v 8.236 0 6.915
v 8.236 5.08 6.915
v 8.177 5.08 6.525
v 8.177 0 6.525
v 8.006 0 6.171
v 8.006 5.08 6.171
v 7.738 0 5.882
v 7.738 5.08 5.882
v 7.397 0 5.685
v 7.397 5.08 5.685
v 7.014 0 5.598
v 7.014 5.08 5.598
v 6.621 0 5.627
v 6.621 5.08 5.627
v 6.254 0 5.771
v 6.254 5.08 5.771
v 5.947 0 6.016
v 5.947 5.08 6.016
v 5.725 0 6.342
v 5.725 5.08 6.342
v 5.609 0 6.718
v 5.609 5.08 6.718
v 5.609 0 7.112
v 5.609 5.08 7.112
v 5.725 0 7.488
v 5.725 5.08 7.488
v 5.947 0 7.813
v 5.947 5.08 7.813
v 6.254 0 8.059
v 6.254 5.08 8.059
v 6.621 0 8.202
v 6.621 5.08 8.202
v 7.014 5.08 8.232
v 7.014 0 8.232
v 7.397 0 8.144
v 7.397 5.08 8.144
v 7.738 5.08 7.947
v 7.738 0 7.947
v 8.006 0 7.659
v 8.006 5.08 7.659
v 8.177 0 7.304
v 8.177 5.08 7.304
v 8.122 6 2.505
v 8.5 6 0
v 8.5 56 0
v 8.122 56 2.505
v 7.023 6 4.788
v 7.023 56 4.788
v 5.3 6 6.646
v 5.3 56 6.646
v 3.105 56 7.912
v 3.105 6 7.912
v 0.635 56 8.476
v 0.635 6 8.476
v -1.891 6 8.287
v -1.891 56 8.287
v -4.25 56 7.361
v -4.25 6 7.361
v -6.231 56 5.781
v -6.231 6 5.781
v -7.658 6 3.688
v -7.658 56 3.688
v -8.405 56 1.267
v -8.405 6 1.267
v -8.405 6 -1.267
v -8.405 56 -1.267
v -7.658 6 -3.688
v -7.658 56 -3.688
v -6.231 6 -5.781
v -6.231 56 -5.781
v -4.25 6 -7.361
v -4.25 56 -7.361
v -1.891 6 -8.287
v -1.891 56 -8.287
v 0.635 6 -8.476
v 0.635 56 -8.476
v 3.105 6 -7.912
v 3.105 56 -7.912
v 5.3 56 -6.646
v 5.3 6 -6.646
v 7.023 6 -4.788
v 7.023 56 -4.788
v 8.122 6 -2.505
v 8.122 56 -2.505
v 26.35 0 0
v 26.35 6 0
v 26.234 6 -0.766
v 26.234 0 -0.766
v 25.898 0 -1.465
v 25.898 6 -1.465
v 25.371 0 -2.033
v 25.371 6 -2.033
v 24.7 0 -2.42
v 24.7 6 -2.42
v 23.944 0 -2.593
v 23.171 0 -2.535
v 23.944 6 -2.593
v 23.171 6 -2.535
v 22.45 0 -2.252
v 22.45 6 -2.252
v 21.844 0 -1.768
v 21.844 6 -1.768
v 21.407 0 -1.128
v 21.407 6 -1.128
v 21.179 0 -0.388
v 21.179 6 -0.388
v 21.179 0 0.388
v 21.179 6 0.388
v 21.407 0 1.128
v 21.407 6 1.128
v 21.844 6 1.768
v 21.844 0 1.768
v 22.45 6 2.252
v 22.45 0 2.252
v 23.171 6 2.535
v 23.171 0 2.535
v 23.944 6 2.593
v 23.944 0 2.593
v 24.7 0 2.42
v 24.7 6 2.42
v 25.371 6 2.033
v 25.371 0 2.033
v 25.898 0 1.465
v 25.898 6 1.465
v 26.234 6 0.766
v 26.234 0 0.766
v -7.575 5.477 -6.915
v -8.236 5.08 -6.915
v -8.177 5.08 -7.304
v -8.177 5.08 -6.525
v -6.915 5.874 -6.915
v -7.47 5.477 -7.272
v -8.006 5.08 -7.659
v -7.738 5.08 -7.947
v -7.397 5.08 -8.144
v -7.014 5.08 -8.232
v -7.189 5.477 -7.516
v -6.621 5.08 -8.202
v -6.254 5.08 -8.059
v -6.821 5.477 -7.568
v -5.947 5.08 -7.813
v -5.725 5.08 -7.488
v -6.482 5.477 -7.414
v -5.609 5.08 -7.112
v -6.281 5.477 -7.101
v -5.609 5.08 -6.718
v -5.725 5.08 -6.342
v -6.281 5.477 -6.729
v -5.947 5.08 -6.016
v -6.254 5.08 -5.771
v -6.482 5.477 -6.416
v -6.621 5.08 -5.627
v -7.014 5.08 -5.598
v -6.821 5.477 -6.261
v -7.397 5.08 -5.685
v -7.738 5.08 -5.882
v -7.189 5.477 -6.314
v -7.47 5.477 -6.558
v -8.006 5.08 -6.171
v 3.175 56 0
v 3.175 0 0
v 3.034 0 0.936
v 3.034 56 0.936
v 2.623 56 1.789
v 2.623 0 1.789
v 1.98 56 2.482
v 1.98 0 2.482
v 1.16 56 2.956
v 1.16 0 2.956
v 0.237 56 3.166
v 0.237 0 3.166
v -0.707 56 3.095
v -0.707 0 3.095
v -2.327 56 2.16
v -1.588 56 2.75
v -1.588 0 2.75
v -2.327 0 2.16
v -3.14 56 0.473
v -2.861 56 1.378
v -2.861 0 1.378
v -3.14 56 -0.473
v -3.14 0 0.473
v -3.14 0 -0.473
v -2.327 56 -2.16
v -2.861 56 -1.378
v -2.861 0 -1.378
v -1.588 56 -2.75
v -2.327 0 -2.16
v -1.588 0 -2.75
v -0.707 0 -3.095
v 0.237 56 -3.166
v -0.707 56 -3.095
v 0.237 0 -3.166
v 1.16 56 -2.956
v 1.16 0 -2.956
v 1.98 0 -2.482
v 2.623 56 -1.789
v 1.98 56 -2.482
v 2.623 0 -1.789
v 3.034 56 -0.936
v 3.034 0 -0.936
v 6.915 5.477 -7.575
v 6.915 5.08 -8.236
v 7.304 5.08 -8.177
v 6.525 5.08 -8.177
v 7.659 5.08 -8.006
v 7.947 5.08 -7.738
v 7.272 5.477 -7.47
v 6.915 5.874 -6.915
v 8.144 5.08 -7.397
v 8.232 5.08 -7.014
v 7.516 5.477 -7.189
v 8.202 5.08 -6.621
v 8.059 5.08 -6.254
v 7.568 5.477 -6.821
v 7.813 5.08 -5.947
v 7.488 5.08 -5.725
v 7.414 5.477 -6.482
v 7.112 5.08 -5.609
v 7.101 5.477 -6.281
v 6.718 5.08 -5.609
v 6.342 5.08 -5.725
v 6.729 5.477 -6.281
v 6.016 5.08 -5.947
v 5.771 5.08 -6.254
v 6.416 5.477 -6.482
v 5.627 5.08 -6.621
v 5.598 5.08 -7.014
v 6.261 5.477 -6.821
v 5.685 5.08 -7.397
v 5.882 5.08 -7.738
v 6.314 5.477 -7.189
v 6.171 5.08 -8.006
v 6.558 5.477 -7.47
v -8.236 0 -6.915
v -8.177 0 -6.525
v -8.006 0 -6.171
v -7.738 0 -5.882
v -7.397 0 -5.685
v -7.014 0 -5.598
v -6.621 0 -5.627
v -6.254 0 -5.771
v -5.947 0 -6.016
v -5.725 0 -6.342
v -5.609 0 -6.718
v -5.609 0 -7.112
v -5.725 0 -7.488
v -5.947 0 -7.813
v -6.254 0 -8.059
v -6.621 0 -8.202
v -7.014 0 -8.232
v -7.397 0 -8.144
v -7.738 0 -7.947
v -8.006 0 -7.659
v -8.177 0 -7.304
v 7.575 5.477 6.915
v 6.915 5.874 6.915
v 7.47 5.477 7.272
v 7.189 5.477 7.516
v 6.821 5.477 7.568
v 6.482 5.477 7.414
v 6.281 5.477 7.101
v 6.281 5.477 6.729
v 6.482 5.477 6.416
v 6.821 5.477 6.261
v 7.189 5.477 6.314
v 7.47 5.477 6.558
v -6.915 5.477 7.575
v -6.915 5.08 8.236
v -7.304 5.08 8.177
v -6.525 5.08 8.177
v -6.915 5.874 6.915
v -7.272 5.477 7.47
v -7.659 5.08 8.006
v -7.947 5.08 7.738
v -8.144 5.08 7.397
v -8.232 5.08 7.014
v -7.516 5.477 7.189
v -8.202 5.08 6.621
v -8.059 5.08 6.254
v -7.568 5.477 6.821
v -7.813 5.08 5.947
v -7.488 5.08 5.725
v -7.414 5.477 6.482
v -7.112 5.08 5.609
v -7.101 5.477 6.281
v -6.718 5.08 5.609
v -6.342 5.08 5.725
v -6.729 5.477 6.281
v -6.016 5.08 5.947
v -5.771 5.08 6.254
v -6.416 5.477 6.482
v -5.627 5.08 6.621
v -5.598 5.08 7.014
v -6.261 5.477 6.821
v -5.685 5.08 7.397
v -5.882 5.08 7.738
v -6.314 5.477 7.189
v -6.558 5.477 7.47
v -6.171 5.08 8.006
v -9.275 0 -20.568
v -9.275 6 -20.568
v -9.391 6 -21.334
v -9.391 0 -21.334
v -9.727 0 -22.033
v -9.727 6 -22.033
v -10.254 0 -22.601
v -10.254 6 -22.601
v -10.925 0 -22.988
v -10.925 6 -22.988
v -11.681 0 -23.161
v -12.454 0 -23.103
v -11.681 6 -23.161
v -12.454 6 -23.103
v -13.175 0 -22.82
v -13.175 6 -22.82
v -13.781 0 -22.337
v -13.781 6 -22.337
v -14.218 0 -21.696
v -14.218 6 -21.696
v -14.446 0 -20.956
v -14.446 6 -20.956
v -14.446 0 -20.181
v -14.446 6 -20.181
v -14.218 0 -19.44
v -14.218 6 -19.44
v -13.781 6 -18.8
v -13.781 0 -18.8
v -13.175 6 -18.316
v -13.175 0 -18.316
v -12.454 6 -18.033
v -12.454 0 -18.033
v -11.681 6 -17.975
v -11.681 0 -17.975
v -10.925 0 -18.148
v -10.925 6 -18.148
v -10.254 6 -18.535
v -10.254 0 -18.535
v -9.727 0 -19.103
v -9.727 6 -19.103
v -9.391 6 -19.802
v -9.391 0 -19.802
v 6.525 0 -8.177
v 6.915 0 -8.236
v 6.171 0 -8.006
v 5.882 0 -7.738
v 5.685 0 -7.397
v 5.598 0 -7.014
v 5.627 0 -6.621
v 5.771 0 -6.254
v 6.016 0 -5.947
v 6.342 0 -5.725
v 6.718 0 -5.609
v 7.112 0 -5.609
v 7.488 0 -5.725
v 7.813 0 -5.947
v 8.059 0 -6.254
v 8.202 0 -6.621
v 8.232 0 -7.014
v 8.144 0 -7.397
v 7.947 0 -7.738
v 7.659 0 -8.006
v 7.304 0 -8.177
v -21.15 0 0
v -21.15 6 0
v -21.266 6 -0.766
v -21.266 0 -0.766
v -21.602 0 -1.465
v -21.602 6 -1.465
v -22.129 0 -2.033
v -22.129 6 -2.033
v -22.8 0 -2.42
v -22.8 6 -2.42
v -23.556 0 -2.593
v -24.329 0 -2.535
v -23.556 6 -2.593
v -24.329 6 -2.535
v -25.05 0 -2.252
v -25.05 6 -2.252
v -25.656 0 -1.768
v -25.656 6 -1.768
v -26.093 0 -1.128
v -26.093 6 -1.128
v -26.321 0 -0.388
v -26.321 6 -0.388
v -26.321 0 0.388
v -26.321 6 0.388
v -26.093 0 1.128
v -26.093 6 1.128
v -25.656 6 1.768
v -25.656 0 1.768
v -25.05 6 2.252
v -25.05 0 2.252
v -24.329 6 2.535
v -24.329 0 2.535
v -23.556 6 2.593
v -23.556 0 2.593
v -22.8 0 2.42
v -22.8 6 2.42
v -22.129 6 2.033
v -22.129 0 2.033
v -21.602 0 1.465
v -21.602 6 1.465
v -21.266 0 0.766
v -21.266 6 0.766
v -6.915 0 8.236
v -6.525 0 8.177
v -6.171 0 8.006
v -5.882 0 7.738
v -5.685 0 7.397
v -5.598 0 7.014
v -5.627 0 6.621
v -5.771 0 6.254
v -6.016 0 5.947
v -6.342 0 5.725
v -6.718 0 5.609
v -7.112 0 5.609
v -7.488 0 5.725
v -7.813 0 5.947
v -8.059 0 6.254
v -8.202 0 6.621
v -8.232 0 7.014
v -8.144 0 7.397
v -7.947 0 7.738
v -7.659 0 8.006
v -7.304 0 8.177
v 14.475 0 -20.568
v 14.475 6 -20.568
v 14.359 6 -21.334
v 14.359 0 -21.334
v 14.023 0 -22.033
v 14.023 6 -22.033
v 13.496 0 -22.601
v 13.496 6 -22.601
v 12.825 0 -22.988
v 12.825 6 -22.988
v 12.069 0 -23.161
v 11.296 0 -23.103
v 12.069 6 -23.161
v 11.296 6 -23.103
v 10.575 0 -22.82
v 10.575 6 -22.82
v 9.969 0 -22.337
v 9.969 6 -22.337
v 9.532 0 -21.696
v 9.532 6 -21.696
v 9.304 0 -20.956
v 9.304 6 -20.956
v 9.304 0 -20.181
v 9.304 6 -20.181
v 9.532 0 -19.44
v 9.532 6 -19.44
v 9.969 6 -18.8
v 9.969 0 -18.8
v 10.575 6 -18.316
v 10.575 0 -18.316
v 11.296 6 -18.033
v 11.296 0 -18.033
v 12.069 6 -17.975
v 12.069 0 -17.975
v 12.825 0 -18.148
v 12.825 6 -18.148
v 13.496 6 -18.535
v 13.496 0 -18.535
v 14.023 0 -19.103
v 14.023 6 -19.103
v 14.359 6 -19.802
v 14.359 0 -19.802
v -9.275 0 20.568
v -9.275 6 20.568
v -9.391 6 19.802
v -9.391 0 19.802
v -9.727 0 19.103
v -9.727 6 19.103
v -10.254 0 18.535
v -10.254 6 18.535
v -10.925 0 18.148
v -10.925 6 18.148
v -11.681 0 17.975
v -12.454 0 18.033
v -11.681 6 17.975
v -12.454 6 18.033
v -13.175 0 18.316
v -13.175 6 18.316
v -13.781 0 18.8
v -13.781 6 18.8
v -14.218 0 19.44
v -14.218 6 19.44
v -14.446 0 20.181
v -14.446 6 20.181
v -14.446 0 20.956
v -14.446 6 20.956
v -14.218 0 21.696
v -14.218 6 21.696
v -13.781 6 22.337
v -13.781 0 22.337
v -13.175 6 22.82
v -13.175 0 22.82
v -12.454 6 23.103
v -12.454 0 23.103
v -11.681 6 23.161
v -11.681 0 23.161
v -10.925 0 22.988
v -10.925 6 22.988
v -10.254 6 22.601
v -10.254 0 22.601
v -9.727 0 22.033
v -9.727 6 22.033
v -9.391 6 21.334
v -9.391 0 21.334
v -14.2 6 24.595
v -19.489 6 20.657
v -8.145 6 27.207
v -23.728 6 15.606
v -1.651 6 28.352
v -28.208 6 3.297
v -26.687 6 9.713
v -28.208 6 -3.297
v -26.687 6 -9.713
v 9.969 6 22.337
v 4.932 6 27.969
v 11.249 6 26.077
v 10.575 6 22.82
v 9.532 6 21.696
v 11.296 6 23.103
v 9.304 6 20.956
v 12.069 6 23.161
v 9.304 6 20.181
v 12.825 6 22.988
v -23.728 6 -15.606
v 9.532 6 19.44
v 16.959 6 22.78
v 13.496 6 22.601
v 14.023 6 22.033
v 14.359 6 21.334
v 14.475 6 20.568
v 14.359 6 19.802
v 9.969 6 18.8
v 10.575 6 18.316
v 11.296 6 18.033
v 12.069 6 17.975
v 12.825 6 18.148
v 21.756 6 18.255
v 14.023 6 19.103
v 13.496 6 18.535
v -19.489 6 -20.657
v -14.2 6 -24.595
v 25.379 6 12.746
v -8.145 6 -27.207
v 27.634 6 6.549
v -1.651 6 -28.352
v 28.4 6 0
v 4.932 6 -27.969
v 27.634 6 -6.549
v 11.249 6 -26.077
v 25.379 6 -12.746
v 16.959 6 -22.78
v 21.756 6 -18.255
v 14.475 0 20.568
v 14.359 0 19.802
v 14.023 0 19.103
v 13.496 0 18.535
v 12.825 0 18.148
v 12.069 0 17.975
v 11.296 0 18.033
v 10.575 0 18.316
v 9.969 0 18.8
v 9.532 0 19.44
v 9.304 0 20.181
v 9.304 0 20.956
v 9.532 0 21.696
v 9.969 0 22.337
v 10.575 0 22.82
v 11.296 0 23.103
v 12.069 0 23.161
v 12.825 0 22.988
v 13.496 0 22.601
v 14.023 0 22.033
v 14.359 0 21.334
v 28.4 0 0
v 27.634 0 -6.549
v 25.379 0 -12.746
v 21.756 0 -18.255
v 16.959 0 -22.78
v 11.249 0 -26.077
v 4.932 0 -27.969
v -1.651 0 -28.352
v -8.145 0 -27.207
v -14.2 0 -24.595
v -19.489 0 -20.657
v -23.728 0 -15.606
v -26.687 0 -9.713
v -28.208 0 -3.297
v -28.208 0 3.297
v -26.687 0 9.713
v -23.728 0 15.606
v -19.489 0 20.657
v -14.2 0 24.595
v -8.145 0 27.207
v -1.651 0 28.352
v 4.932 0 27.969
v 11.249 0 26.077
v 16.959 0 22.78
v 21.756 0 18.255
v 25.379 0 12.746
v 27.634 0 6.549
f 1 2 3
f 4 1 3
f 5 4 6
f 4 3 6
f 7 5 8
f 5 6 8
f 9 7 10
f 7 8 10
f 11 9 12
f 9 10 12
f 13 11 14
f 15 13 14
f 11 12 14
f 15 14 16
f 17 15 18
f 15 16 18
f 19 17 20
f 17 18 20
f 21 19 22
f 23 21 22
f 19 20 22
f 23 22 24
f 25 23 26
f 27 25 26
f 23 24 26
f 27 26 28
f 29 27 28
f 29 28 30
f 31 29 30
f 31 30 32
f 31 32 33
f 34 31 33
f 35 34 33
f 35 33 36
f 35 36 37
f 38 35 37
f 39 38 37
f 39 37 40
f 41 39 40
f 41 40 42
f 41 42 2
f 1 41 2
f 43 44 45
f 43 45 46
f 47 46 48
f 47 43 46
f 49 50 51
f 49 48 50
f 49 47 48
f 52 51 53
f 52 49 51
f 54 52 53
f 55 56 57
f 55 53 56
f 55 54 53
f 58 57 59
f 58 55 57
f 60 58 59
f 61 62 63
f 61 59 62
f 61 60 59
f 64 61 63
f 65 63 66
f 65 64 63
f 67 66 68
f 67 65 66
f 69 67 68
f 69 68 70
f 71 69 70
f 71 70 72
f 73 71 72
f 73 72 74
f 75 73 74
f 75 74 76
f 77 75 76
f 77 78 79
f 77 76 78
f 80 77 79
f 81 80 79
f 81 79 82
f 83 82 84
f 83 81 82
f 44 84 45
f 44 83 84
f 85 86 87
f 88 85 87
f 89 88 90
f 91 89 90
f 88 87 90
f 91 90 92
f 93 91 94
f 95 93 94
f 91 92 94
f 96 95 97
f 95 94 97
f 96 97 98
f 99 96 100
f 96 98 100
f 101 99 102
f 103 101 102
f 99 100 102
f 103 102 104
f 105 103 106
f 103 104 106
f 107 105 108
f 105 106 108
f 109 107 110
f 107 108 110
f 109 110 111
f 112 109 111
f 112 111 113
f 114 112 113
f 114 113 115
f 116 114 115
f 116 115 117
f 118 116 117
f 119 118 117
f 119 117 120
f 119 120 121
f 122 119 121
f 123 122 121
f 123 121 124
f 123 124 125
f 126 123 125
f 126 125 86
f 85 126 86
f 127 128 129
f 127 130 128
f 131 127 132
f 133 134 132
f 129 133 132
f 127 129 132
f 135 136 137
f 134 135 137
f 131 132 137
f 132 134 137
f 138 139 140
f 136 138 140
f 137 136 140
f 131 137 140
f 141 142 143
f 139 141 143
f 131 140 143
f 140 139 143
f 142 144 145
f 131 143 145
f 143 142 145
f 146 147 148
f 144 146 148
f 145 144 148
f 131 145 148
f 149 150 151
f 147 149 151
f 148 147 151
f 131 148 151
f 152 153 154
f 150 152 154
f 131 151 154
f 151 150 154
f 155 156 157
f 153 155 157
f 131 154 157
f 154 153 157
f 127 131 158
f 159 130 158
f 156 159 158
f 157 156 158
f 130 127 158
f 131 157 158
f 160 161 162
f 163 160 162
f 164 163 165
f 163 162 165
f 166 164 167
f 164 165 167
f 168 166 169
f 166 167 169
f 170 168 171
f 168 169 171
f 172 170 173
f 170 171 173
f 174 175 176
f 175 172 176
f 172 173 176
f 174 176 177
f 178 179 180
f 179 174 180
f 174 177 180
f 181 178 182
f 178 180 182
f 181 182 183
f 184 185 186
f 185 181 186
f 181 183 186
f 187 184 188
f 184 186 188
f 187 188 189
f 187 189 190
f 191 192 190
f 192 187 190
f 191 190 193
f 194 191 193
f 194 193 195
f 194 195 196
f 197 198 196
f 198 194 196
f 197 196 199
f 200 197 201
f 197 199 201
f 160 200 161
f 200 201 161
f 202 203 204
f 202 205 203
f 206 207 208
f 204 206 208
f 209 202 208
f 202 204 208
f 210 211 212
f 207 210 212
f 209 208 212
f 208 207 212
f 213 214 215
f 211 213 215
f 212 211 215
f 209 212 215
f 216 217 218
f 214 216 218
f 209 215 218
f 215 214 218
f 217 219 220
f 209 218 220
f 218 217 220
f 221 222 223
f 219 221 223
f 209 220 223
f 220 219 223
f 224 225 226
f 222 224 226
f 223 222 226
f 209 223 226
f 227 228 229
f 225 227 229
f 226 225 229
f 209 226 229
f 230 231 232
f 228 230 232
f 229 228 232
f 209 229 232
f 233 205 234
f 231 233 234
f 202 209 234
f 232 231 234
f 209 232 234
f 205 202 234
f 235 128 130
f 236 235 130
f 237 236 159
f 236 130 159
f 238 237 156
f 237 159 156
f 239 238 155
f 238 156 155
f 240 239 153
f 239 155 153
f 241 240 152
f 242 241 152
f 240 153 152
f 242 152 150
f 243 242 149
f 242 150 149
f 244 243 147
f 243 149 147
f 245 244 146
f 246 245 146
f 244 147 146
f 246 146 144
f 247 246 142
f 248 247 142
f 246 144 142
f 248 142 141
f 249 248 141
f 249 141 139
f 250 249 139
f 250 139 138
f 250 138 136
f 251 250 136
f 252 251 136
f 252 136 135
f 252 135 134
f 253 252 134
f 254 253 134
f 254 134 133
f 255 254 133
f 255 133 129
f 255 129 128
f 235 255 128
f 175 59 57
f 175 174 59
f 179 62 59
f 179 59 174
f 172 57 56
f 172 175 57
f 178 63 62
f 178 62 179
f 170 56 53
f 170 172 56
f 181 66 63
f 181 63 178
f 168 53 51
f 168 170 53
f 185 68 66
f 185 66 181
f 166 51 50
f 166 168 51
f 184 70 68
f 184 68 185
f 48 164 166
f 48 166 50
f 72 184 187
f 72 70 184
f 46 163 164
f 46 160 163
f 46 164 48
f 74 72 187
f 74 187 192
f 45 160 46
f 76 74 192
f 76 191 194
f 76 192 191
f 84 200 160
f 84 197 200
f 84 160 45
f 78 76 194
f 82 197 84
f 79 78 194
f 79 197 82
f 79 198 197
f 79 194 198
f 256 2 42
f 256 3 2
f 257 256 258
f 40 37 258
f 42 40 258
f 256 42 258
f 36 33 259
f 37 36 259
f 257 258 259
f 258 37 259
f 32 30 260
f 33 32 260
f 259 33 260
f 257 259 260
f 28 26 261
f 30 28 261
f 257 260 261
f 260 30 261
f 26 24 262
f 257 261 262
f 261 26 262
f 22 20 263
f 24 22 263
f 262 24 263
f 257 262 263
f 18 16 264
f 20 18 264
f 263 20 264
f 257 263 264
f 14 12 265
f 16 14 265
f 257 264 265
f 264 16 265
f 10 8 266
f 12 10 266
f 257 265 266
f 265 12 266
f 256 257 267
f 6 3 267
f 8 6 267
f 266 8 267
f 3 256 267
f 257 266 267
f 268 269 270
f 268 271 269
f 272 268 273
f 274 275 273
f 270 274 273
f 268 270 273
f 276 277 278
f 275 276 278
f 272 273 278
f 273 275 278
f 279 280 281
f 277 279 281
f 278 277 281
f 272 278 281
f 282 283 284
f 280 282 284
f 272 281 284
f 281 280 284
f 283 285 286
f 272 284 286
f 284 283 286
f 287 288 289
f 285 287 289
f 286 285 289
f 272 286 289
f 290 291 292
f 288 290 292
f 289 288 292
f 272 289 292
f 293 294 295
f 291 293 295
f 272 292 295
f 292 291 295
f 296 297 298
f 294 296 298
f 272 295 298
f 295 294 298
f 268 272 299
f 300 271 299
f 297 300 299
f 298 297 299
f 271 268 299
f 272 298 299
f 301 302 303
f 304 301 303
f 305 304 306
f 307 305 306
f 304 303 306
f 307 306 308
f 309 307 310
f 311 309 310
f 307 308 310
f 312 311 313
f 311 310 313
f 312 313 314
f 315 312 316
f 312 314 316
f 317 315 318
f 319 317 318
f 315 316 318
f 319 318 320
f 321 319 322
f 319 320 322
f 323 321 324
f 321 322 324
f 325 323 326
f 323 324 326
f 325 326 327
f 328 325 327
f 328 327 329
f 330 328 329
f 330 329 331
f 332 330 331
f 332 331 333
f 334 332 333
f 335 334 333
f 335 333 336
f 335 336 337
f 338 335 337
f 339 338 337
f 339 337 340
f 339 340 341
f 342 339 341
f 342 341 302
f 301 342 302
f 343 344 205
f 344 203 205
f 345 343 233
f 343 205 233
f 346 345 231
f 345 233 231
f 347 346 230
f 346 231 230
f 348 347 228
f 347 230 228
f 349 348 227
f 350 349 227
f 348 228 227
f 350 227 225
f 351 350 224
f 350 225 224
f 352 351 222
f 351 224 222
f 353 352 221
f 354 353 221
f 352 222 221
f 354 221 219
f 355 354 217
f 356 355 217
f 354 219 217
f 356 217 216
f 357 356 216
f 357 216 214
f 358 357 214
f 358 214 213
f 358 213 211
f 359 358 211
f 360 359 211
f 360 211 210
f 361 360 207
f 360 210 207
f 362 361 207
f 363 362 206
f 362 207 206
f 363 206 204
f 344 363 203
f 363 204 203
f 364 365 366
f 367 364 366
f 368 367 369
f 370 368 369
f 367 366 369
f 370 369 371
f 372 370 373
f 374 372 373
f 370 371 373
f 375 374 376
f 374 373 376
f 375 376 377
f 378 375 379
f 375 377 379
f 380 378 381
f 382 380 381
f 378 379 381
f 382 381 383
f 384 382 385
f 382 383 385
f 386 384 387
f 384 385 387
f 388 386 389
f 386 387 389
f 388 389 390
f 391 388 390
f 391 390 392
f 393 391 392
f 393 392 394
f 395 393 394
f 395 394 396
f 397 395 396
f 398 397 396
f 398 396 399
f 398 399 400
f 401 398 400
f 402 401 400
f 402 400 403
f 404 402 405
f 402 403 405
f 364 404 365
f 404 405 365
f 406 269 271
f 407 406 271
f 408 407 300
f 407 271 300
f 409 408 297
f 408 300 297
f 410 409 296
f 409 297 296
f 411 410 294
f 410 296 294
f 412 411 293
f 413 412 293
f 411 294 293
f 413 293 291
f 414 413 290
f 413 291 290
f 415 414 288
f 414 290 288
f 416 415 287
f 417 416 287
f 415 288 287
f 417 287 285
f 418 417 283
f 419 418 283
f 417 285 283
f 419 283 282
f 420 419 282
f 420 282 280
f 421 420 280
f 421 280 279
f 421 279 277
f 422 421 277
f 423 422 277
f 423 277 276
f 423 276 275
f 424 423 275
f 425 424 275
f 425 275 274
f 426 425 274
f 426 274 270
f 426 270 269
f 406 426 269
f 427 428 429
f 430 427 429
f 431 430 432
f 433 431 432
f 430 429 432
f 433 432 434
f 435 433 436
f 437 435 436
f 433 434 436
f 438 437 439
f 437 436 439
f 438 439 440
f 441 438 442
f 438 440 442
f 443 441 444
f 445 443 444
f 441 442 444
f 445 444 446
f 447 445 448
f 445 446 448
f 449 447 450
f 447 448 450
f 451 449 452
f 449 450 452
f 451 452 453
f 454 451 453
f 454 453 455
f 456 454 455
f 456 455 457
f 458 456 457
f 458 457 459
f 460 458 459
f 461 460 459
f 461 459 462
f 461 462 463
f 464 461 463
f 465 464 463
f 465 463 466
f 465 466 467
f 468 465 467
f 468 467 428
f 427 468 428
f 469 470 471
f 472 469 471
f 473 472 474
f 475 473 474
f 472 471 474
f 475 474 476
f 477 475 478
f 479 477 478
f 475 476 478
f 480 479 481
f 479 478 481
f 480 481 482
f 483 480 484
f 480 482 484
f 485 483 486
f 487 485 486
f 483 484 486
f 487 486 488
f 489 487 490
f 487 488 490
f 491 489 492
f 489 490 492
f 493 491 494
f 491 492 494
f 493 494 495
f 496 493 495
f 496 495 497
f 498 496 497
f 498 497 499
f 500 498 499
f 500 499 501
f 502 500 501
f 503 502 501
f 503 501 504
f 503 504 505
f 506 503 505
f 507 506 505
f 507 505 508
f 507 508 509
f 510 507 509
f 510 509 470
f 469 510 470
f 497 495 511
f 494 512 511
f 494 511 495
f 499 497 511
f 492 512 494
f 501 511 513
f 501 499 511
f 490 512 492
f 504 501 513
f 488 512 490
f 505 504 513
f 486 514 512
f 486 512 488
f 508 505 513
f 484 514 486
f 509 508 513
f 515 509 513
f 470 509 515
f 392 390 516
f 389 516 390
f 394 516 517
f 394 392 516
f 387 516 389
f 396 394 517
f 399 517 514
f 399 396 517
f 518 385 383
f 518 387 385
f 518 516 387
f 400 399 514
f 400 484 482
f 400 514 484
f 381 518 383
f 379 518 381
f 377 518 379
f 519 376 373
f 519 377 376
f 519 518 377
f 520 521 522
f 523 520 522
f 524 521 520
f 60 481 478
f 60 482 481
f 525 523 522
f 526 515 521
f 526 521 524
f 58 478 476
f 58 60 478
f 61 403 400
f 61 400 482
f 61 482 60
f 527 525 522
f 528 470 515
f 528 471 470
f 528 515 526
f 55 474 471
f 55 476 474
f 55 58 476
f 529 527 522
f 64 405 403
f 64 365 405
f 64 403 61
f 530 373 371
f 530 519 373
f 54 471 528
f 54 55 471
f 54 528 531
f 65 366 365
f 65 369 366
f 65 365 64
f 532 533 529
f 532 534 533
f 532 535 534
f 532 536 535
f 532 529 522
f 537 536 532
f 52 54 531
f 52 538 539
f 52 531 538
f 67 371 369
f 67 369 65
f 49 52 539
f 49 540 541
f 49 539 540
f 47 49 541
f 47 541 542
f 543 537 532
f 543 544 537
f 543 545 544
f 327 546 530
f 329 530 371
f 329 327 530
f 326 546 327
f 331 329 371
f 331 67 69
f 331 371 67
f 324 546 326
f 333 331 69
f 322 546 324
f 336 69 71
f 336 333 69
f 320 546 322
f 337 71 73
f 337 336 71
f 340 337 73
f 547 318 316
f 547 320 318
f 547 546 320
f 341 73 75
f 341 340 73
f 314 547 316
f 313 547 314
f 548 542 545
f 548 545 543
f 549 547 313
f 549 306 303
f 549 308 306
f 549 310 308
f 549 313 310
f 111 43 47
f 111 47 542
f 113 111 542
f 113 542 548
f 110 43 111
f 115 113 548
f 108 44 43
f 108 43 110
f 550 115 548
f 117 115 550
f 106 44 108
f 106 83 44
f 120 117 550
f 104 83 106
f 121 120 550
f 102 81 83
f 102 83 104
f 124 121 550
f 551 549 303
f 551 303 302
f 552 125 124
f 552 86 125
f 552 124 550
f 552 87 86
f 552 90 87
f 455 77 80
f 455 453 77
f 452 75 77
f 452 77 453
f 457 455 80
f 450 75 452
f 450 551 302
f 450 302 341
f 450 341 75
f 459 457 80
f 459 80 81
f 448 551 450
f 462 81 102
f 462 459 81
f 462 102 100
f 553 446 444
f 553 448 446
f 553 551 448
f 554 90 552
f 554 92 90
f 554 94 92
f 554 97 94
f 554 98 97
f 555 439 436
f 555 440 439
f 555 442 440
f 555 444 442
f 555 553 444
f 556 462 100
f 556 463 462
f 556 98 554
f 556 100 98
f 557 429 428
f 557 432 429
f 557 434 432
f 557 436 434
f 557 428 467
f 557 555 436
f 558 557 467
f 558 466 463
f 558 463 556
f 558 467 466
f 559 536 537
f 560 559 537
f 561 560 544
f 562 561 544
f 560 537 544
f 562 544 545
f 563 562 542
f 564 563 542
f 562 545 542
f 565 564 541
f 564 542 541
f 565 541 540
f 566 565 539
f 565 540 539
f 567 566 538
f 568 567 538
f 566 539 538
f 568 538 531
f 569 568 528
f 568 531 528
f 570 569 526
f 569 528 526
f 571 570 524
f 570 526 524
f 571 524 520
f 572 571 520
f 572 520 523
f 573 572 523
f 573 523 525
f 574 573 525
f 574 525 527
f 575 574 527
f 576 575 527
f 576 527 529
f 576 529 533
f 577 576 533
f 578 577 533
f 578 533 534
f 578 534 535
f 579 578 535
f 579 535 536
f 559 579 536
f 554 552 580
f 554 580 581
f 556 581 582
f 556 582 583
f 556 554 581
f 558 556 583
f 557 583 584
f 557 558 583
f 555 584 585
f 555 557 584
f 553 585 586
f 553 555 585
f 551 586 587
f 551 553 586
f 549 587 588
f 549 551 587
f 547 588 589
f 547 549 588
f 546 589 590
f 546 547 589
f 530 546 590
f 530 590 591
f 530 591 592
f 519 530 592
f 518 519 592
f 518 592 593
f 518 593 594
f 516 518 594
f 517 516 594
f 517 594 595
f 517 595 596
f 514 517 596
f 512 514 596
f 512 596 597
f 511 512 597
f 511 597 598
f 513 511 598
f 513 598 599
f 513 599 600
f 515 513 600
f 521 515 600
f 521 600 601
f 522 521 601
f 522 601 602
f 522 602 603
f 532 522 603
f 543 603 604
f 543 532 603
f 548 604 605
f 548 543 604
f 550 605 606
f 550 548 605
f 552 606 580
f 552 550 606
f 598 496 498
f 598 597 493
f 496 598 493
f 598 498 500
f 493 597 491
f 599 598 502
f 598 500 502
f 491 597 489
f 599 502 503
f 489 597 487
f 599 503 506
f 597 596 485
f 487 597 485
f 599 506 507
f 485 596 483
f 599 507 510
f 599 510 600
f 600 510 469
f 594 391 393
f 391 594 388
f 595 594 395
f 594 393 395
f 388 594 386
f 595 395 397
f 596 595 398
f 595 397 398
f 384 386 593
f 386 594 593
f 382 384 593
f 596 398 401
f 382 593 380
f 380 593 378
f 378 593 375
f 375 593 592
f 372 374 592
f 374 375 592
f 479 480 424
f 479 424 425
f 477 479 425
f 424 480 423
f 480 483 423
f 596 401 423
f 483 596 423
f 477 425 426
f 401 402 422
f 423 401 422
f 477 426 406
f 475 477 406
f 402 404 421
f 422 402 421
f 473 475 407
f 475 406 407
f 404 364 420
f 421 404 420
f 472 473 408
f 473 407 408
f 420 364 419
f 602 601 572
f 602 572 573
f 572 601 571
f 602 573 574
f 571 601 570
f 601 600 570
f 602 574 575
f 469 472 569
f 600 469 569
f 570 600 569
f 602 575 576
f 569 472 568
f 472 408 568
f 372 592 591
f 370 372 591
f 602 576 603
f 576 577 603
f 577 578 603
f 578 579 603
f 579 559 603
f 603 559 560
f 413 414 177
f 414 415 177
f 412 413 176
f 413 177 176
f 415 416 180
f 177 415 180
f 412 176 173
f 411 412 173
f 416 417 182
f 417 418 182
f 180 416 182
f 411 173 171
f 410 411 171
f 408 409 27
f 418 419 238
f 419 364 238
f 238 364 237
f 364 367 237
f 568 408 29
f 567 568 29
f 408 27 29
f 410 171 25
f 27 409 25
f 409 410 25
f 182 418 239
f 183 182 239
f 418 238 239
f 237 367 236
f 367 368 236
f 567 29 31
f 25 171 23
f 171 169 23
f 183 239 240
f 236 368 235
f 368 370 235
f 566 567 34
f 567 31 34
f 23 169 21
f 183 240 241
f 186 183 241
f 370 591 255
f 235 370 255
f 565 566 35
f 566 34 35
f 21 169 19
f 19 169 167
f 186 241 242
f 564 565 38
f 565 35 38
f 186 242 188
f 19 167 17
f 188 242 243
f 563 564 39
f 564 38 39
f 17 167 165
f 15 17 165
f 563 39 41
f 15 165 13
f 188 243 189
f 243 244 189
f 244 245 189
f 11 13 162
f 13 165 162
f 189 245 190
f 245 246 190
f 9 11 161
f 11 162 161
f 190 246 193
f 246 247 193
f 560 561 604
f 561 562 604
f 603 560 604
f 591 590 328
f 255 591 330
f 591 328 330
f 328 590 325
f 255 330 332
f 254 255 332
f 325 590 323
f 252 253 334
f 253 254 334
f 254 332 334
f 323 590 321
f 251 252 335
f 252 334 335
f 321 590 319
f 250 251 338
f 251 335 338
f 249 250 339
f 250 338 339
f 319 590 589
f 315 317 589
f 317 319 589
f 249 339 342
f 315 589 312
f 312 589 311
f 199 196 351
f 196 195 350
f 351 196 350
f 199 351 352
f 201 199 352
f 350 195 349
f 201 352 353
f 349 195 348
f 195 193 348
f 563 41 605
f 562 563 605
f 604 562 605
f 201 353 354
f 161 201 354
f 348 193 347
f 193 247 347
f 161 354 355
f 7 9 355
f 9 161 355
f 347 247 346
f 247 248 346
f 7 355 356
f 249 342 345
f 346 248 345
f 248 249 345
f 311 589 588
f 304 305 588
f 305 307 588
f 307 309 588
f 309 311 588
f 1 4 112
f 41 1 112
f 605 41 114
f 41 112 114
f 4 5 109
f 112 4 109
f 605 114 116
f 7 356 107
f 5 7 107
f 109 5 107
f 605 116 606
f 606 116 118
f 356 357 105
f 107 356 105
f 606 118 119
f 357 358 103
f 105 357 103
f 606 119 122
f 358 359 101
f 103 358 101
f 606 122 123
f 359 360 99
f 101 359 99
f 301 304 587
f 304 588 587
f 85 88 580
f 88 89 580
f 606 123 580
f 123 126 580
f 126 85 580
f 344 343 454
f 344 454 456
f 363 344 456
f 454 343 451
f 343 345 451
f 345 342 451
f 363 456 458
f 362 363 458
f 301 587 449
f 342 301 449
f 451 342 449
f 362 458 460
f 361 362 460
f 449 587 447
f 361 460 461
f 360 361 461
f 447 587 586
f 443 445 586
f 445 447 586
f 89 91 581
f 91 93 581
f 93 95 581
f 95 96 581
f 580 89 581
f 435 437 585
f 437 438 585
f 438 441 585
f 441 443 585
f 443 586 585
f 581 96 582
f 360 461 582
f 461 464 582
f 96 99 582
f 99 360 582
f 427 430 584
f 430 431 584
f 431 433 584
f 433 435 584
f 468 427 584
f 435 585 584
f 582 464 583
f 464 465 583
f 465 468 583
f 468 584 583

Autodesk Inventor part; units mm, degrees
ref_plane "YZ Plane" through (0, 0, 0) normal (1, 0, 0) x (0, 1, 0)
ref_plane "XZ Plane" through (0, 0, 0) normal (0, 1, 0) x (-1, 0, 0)
ref_plane "XY Plane" through (0, 0, 0) normal (0, 0, 1) x (1, 0, 0)
sketch "Sketch1" plane through (0, 0, 0) normal (0, 0, 1) x (1, 0, 0)
  line L0 (0, 0) -> (0, 26.4) construction
  line L1 (3.175, 56) -> (3.175, 0)
  line L2 (28.4, 0) -> (28.4, 6)
  line L3 (3.175, 0) -> (28.4, 0)
  line L4 (8.5, 56) -> (8.5, 6)
  line L5 (8.5, 6) -> (28.4, 6)
  line L6 (8.5, 56) -> (8.5, -232.68) construction
  line L7 (8.5, 56) -> (8.5, 16.2) construction
  line L8 (8.5, 56) -> (3.175, 56)
  dimension "d0" = 26.4
  dimension "d5" = 6
  dimension "d11" = 5.325
  dimension "d32" = 3.175
  dimension "d37" = 28.4
  dimension "d38" = 50
revolve "Revolution1" add sketch "Sketch1" angle 360 about axis through (0, 0, 0) along (0, 1, 0)
sketch "Sketch4" plane through (0, 6, 0) normal (0, 1, 0) x (1, 0, 0)
  line L0 (0, 0) -> (-23.75, 0) construction
  circle A0 centre (-23.75, 0) radius 2.6
  circle A1 centre (-11.875, -20.5681) radius 2.6
  circle A2 centre (11.875, -20.5681) radius 2.6
  circle A3 centre (23.75, 0) radius 2.6
  circle A4 centre (11.875, 20.5681) radius 2.6
  circle A5 centre (-11.875, 20.5681) radius 2.6
  dimension "d23" = 23.75
  dimension "d24" = 5.2
  dimension "d27" = 360
extrude "Extrusion1" cut sketch "Sketch4" against normal blind 6
sketch "Sketch5" plane through (0, 0, 0) normal (0, -1, 0) x (1, 0, 0)
  circle A0 centre (0, 0) radius 3.175 projected
  line L0 (0, 0) -> (6.9148, -6.9148)
  line L1 (0, 0) -> (9.779, 0) construction
  dimension "d39" = 9.779
  dimension "d40" = 45
hole "Hole2" at (6.9148, 0, -6.9148) direction (0, 1, 0) diameter 2.6416 depth 5.08 tip angle 118 thread size "6-32 UNC" class "2B" standard "ANSI Unified Screw Threads"
pattern_circular "Circular Pattern1" count 4 over 360 about axis through (0, 28, 0) along (0, -1, 0) of "Hole2"
properties part number "Mechanum Wheel Adapter"
